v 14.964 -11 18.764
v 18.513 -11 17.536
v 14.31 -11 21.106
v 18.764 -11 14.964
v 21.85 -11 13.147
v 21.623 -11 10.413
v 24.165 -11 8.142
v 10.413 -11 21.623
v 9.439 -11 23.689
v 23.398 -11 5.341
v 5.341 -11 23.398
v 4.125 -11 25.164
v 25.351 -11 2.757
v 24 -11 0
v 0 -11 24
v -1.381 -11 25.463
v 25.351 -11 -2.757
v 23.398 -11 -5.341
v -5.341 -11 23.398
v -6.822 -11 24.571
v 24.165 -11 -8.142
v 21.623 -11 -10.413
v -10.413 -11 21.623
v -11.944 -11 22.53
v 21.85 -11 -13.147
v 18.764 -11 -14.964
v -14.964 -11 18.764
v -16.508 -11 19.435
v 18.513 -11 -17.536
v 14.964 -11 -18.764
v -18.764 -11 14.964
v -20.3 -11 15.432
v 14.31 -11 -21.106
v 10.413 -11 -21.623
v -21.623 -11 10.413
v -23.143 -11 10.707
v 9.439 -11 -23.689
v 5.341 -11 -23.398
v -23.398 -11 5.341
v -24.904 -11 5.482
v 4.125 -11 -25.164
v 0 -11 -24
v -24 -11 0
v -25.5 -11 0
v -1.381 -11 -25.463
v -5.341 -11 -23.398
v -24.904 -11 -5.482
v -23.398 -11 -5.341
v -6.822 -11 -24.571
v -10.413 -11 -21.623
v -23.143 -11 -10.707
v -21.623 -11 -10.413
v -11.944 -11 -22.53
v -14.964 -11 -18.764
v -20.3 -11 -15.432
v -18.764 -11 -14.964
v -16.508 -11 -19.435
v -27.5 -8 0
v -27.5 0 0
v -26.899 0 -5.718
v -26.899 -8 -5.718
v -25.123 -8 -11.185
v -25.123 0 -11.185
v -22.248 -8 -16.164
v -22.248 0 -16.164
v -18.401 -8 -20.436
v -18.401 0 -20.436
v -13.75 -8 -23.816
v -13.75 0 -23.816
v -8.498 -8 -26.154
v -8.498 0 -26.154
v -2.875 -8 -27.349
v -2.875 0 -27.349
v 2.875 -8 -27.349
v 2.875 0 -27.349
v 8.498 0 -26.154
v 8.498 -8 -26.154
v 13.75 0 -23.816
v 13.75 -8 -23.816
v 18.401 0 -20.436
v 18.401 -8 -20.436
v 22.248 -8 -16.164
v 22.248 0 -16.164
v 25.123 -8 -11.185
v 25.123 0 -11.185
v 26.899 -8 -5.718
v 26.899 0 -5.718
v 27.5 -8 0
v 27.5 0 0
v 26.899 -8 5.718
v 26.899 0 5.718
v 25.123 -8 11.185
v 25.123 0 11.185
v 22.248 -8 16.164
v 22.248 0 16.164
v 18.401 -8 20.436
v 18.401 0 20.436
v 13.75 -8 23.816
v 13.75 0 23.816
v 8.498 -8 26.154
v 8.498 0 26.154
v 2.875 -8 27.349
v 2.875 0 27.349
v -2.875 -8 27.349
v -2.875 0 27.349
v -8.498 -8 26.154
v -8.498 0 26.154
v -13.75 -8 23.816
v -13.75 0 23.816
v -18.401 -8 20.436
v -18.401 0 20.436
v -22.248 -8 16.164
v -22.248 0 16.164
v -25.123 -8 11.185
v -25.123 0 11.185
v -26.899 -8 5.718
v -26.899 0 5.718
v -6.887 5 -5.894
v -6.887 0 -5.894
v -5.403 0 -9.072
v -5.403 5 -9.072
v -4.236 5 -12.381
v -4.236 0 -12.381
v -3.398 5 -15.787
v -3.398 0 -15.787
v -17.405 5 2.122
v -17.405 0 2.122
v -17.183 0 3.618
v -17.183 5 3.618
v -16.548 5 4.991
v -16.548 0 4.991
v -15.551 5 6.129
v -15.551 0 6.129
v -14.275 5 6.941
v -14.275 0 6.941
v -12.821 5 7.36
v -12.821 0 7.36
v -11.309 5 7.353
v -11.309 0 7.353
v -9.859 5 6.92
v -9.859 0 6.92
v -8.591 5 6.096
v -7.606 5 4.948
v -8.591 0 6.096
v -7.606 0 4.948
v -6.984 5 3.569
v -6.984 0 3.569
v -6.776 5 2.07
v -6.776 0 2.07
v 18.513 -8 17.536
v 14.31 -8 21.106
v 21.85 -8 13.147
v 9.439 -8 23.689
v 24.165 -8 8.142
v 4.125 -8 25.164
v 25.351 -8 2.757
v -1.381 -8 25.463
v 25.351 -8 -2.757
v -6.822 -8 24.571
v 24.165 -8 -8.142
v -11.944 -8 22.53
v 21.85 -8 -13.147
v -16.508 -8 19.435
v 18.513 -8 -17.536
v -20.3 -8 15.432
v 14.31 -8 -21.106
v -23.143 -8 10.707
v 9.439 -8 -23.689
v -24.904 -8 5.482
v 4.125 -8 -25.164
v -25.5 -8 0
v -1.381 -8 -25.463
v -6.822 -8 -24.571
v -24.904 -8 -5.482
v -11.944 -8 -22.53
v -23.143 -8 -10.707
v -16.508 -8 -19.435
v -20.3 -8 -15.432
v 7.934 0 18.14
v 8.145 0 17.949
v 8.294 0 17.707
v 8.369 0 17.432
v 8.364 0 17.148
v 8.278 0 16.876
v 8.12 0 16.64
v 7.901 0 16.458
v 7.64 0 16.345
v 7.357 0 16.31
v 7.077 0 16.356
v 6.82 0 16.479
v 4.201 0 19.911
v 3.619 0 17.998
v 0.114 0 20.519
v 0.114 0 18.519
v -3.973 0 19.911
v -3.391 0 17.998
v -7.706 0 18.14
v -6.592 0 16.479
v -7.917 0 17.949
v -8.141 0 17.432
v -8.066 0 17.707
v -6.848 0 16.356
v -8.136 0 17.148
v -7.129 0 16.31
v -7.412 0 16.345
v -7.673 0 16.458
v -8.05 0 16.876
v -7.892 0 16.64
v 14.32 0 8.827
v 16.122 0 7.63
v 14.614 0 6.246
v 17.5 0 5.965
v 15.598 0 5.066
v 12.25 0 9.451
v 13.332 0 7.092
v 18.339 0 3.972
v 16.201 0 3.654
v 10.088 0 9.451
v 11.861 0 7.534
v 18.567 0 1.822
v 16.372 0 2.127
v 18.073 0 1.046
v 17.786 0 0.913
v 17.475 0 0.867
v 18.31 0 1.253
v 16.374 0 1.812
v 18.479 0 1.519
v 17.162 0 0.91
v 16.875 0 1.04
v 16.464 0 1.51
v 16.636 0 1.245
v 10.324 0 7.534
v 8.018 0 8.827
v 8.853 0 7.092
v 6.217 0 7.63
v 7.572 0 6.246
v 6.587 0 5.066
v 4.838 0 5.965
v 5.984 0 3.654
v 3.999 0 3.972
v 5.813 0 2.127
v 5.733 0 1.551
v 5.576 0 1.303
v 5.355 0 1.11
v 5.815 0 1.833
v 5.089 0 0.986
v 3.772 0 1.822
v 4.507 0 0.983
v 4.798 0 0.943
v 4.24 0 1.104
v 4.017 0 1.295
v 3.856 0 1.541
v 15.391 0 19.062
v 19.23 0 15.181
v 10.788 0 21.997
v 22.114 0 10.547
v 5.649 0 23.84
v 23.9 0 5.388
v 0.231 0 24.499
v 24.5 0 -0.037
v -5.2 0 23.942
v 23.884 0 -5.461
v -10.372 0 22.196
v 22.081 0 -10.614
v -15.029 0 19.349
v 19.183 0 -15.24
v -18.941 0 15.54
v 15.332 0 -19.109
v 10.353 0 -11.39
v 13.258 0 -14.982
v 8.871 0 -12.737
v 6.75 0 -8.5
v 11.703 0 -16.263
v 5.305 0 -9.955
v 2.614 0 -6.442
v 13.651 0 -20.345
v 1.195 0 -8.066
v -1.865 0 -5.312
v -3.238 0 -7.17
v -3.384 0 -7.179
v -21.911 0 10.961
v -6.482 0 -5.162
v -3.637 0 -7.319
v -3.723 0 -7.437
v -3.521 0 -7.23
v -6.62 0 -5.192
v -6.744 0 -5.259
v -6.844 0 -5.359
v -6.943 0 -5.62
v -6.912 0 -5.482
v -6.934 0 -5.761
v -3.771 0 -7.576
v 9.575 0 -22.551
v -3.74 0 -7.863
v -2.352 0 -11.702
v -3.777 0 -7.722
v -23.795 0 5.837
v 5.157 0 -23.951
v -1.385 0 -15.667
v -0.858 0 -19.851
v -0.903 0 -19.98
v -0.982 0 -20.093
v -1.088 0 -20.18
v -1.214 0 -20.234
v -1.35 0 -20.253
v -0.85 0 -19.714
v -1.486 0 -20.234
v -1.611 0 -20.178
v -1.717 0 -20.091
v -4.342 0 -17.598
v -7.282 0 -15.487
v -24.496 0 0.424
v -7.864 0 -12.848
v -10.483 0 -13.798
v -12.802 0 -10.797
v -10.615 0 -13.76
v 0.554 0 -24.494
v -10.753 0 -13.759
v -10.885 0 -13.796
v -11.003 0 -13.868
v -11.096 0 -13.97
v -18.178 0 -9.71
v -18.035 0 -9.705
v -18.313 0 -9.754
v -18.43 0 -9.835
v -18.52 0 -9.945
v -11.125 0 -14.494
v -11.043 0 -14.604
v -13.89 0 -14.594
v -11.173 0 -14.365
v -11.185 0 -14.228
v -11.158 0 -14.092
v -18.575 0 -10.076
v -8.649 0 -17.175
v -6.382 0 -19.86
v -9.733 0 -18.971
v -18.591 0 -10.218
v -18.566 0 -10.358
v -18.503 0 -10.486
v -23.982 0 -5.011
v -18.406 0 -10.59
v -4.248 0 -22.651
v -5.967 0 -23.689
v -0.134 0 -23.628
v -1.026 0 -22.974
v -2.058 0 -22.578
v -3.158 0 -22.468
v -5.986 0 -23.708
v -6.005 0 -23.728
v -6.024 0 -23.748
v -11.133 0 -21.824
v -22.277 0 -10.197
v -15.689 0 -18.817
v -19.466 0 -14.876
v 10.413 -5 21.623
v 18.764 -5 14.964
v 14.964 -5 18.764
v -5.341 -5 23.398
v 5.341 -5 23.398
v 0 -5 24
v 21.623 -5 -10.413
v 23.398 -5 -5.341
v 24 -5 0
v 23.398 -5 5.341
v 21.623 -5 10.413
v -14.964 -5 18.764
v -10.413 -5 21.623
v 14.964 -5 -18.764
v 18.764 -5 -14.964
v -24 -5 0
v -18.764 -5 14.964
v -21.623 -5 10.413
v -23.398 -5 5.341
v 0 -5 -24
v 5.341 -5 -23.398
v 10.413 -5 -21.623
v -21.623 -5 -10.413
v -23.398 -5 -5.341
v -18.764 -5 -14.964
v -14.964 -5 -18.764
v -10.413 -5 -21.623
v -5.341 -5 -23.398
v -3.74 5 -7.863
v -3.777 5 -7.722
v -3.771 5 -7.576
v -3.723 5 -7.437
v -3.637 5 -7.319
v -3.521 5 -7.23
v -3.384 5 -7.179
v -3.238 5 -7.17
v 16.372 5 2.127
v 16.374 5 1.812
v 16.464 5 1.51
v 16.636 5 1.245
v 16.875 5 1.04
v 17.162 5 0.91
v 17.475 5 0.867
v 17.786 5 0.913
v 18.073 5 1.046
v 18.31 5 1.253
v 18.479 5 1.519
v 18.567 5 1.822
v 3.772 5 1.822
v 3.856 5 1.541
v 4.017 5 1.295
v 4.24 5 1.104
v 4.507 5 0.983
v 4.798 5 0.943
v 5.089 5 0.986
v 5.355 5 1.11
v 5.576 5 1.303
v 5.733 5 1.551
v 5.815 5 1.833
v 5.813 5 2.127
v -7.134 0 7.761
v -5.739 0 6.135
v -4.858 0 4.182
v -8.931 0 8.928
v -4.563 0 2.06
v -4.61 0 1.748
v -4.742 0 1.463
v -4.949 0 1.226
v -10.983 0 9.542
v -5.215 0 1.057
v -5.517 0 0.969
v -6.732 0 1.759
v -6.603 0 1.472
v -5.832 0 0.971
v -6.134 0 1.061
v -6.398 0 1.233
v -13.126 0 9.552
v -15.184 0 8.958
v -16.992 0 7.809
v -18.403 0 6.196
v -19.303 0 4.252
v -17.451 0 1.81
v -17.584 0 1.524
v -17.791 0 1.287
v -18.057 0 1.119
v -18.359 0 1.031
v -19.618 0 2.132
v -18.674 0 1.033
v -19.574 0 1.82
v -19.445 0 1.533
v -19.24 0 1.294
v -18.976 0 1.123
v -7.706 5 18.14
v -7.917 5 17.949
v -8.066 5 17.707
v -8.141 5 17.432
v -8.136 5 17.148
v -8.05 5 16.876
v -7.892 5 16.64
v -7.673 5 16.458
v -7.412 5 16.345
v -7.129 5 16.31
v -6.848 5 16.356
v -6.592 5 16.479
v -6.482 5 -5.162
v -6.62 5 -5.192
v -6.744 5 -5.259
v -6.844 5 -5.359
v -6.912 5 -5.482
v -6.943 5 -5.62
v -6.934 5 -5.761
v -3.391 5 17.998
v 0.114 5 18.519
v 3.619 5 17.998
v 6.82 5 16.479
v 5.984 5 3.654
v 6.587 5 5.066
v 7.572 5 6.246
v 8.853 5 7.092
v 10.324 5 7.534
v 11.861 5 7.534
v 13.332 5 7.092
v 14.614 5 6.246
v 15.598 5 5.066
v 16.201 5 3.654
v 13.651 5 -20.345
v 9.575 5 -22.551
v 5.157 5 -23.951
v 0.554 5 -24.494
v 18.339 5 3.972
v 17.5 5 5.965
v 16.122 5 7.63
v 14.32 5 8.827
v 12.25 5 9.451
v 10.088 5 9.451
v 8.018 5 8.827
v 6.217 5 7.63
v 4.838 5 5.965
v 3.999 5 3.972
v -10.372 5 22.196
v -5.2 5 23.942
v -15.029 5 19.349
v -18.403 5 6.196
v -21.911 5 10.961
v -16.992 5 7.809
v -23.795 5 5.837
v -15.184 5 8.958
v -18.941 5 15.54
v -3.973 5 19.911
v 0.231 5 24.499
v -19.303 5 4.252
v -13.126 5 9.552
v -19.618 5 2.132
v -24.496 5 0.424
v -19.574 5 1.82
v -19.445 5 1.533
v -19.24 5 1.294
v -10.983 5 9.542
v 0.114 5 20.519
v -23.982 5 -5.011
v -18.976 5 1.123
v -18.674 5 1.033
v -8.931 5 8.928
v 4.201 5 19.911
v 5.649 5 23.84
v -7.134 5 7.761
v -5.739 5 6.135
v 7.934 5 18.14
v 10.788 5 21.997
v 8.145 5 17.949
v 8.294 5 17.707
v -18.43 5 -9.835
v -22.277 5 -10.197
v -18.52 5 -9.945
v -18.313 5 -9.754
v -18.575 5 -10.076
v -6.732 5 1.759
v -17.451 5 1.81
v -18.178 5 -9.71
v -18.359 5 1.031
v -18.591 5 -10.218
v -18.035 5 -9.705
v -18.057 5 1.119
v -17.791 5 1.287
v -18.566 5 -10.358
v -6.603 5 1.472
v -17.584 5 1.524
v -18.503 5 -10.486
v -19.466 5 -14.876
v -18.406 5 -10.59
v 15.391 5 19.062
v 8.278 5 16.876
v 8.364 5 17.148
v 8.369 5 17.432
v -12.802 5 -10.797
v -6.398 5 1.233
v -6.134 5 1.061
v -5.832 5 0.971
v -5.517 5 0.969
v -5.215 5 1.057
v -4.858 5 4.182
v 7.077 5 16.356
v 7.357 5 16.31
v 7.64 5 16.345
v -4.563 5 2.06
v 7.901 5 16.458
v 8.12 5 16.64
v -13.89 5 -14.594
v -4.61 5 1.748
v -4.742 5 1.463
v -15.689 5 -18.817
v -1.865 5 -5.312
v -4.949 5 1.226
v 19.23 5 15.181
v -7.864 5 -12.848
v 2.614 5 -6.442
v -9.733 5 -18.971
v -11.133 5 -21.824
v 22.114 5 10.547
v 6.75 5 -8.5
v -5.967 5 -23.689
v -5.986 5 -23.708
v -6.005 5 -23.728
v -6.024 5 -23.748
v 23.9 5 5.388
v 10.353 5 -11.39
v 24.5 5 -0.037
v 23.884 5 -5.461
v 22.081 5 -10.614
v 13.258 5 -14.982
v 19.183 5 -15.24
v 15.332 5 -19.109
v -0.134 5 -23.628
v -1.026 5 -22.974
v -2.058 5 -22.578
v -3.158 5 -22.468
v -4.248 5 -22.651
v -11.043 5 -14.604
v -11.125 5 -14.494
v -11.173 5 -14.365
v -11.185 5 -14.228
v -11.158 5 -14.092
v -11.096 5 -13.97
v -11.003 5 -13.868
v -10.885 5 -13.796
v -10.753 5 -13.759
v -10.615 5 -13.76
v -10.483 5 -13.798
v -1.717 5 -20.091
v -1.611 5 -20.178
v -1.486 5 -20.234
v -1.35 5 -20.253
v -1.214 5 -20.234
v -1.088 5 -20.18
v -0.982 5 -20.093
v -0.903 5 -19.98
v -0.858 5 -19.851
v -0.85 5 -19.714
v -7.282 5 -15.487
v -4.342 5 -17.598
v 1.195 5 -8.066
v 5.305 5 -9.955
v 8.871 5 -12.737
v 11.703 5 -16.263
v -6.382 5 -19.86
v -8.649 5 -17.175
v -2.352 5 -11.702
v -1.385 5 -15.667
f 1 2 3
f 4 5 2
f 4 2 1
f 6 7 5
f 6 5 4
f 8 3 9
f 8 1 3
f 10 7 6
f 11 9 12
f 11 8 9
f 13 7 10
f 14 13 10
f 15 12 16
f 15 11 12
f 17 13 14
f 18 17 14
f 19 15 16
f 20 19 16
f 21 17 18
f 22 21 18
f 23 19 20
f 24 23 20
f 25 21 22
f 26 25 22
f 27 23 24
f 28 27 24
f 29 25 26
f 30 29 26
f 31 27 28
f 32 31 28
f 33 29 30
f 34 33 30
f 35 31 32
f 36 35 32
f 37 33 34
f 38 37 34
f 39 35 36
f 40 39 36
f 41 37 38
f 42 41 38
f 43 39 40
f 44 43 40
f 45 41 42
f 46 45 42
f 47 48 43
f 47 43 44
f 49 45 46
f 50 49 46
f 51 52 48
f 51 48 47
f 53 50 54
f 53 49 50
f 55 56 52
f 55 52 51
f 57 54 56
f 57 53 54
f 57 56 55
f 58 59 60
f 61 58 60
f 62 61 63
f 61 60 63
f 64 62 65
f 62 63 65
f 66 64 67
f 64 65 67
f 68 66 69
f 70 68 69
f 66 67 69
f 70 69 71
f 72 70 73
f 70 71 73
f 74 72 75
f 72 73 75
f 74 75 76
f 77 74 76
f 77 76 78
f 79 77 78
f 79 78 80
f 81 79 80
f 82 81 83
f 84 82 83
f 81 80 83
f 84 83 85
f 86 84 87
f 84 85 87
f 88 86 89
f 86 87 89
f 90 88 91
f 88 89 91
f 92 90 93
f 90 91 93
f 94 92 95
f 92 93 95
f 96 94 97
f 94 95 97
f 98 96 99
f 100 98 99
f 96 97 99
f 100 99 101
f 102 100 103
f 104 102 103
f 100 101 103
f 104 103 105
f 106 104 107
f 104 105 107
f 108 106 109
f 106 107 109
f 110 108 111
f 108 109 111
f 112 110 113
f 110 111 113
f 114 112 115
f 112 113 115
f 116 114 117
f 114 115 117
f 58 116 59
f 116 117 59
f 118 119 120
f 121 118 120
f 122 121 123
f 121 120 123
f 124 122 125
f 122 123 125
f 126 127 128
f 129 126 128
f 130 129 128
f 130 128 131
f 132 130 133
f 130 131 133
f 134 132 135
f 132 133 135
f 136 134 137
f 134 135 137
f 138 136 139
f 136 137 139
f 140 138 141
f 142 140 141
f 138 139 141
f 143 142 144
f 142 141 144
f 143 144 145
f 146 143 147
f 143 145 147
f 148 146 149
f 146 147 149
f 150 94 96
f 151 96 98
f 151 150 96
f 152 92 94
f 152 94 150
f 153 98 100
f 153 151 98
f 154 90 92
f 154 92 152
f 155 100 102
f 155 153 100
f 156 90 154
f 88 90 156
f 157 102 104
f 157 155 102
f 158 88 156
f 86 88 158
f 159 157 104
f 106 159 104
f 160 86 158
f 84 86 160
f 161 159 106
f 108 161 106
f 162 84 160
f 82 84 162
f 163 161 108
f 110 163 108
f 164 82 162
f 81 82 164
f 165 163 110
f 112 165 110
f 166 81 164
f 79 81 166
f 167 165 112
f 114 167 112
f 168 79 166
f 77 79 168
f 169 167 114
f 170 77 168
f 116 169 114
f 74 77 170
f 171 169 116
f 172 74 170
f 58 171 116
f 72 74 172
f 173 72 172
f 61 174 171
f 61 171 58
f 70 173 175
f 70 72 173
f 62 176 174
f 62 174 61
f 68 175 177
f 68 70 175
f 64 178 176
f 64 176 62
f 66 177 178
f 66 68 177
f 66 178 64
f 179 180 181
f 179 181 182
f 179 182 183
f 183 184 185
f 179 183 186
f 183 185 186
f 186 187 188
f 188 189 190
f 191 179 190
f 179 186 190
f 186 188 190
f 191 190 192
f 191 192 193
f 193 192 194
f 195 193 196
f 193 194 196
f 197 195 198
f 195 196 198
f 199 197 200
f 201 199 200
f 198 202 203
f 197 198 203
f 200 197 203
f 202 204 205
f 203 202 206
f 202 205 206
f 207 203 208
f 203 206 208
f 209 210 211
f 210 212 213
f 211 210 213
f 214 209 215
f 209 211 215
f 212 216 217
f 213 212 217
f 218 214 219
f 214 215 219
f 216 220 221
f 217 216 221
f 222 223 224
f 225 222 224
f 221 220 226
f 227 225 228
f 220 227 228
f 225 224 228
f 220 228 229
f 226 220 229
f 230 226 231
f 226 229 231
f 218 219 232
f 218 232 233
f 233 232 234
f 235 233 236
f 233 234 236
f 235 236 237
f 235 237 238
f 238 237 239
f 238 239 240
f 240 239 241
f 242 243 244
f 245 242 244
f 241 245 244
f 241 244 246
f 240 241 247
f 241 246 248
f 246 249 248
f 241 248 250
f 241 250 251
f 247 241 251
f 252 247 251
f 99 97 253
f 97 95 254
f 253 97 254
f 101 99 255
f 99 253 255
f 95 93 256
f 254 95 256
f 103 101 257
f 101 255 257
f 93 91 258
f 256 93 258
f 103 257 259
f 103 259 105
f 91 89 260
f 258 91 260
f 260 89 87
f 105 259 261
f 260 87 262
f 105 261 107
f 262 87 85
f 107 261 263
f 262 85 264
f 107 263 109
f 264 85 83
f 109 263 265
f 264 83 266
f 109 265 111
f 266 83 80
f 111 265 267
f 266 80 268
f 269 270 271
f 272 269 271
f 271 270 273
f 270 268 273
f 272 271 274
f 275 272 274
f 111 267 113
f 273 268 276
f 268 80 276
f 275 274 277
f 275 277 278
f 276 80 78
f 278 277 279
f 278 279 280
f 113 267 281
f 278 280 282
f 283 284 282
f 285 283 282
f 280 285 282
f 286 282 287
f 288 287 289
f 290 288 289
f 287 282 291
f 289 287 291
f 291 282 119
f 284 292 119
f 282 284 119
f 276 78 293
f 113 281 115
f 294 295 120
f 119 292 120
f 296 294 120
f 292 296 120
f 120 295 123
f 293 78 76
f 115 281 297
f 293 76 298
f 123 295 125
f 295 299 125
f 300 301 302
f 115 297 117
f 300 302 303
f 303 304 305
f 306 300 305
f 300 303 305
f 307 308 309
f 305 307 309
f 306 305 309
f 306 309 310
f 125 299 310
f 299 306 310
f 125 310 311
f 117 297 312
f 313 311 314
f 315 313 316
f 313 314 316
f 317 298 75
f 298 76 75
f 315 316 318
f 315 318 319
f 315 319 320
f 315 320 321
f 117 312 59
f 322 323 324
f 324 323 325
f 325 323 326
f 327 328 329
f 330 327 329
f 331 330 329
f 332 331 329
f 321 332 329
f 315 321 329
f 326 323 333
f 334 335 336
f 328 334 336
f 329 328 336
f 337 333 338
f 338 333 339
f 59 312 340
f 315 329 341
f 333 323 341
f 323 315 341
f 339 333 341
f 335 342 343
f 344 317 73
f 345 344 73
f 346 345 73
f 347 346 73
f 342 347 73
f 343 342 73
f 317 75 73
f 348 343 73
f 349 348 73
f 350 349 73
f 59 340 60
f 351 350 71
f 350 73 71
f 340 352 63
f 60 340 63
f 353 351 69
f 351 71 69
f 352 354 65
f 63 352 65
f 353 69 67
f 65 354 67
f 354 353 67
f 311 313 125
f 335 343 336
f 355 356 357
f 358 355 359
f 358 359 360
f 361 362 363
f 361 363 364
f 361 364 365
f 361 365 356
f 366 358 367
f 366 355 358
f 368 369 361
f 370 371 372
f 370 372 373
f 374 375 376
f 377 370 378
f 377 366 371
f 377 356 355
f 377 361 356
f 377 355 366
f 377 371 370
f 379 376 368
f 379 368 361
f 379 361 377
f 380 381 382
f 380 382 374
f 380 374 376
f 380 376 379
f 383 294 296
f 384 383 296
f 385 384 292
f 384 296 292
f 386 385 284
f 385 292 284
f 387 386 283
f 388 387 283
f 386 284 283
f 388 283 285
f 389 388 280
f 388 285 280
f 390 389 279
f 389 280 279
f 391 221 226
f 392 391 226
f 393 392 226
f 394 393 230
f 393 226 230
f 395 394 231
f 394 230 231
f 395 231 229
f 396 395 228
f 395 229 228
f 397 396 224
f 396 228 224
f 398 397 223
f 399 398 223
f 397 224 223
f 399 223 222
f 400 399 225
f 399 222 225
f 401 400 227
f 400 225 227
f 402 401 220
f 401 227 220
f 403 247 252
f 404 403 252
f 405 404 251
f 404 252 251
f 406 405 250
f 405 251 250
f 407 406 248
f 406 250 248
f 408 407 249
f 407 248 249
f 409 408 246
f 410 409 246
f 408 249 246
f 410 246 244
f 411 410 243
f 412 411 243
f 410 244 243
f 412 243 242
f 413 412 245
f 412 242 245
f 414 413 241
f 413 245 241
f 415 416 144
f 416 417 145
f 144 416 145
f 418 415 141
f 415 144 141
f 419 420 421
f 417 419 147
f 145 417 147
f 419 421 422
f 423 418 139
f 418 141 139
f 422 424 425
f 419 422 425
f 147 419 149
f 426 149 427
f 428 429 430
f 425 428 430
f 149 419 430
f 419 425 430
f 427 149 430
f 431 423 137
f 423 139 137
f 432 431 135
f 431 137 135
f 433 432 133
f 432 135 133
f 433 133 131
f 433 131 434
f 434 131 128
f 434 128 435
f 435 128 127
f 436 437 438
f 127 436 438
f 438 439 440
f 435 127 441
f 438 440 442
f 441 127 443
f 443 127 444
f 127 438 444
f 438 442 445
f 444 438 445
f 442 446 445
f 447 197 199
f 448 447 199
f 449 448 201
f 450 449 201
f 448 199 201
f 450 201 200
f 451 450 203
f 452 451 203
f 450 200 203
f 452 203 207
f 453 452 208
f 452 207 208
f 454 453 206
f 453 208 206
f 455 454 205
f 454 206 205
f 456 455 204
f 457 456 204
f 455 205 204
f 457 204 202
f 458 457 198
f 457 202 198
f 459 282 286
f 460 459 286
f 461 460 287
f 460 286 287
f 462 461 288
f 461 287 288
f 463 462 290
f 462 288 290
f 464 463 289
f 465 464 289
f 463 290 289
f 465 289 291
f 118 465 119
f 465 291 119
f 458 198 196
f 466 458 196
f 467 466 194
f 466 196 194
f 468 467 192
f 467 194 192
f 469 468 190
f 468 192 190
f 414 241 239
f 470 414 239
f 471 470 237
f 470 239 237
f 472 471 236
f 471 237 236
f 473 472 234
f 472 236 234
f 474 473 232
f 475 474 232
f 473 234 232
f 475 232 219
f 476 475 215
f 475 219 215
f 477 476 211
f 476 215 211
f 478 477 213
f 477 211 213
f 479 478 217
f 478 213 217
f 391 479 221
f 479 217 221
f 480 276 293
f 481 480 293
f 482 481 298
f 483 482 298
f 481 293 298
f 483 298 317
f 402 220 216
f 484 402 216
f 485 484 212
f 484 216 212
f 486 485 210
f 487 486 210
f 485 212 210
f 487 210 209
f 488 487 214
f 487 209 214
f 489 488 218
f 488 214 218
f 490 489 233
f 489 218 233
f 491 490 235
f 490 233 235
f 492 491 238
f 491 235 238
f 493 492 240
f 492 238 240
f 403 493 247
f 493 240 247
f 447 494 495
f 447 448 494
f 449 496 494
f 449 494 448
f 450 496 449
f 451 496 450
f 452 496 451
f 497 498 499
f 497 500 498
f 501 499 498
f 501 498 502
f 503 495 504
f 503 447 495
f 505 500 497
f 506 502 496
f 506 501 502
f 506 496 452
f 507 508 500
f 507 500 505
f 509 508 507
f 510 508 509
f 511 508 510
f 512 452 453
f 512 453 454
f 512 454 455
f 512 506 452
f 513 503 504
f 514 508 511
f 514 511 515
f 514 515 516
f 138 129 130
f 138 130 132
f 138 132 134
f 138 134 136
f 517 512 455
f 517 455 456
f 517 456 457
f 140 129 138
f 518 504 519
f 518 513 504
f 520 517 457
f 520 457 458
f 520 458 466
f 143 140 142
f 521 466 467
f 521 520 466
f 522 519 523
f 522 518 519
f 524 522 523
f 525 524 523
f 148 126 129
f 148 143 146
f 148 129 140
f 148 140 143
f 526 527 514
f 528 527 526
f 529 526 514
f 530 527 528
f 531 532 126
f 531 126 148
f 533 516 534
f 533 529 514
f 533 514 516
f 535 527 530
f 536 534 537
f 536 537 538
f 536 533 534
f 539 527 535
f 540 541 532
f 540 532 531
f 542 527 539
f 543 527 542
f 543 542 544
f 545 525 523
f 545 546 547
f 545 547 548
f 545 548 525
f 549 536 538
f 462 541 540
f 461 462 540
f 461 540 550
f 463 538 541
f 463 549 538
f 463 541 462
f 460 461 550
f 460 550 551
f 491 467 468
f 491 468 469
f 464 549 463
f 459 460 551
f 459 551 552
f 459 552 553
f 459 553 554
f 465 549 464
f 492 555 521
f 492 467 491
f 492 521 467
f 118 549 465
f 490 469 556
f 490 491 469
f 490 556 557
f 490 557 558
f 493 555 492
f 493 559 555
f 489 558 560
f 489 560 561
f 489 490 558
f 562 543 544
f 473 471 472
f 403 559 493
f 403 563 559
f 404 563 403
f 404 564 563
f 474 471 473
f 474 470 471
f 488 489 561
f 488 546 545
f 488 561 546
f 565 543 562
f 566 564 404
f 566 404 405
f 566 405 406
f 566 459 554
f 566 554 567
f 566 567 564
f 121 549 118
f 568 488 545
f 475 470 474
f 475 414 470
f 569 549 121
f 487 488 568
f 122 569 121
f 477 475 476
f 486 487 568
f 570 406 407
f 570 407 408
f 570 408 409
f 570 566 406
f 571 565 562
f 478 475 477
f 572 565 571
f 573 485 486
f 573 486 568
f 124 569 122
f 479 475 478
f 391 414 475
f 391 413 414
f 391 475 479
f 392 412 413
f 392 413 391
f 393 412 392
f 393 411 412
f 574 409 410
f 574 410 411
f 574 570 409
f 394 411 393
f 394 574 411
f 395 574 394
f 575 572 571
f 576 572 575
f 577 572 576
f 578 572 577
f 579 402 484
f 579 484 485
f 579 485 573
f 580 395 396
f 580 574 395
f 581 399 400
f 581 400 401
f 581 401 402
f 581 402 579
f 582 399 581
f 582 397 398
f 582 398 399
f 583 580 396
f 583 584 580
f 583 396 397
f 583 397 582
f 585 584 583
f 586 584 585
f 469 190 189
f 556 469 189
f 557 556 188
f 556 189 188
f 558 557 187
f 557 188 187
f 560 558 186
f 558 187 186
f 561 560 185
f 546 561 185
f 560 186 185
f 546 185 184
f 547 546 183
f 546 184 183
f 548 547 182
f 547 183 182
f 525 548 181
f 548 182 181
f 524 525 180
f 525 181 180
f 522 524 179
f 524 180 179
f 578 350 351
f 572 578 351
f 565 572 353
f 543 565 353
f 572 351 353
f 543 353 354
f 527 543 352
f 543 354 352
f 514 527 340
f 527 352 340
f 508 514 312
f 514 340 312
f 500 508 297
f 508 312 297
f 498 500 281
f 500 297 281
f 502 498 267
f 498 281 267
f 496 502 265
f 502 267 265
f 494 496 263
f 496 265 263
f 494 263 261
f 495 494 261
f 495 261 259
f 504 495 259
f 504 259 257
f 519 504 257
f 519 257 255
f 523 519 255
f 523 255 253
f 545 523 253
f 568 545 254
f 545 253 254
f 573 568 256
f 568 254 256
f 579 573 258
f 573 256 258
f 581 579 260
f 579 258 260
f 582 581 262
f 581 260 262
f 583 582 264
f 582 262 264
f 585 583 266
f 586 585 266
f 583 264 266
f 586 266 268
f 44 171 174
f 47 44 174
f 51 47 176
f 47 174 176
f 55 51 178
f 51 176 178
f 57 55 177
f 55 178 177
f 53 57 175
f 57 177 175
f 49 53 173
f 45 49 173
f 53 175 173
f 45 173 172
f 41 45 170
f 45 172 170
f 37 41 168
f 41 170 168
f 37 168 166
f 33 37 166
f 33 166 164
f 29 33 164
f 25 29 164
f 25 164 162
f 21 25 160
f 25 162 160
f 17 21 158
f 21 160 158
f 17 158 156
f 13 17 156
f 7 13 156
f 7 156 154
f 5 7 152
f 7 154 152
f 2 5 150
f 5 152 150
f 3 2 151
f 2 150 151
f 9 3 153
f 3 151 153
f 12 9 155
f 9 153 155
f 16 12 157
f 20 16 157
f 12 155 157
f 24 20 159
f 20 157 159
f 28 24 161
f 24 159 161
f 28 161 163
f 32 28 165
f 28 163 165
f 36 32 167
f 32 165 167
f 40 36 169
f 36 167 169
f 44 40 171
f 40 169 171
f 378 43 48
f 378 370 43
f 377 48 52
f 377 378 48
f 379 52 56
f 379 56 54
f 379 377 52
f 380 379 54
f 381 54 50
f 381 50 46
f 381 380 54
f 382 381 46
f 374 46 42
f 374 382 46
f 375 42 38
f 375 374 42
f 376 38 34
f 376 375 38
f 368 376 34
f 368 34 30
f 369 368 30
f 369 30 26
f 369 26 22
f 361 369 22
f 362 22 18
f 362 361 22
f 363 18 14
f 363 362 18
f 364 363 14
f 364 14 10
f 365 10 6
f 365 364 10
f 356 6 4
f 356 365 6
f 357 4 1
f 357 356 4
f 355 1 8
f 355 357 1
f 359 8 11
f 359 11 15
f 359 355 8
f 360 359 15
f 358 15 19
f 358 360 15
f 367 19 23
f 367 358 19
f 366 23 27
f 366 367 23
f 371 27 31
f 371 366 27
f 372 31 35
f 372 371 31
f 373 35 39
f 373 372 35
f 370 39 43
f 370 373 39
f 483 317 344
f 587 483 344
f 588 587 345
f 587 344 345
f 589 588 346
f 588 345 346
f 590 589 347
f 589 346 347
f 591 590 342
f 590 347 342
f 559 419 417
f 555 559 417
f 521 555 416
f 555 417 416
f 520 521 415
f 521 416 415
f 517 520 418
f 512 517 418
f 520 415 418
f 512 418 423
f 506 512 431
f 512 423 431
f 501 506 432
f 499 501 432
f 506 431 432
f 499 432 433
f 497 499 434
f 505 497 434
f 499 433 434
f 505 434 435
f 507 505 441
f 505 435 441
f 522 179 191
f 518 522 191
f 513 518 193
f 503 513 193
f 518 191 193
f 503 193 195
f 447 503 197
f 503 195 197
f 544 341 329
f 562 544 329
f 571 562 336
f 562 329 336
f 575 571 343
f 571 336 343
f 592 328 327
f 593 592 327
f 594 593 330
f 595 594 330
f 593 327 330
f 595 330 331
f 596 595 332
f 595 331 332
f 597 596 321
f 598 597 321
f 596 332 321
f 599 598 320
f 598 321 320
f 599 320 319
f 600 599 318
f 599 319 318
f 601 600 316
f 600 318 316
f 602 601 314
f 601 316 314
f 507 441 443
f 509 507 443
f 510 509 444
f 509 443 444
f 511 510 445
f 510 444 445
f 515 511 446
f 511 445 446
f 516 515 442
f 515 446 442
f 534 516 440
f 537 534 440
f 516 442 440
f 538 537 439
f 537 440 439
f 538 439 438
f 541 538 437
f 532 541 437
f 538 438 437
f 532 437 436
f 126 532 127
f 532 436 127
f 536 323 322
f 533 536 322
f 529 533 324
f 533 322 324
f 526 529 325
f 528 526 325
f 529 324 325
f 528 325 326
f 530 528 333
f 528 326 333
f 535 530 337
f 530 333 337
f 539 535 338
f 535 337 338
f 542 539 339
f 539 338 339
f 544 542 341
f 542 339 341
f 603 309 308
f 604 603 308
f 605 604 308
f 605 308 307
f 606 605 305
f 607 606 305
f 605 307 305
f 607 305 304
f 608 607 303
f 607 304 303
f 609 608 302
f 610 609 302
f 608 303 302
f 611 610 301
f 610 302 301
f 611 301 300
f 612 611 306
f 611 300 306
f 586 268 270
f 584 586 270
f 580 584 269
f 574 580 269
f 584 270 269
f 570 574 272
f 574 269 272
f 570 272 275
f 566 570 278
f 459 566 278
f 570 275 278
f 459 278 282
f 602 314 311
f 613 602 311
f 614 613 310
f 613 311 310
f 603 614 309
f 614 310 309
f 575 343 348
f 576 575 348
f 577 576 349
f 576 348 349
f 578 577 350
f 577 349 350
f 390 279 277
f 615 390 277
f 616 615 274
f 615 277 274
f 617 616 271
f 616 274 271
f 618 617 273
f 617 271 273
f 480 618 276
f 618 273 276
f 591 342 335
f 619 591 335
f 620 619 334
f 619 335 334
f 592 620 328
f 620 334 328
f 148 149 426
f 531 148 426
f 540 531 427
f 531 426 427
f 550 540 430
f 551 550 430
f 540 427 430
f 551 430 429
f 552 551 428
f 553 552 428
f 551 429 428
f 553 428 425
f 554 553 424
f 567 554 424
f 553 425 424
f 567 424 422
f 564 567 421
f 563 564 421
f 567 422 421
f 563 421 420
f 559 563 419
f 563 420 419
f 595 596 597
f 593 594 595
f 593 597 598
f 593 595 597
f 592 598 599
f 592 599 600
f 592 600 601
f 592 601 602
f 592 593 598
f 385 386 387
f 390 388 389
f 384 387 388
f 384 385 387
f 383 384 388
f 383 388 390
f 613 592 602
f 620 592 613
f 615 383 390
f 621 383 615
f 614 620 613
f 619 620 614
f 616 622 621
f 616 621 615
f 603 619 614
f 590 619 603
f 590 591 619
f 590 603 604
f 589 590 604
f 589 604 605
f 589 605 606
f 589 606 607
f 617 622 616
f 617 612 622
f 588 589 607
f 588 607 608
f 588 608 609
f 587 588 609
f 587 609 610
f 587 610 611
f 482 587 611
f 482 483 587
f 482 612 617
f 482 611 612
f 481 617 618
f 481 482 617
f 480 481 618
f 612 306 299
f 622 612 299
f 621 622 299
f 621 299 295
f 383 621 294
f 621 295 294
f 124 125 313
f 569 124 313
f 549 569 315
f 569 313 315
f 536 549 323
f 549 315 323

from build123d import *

# Parameters (mm, degrees)
SALIENTE_EXTRUIR1_DEPTH   = 5
SALIENTE_EXTRUIR1_2_DEPTH = 5
CROQUIS2_R                = 27.5
SALIENTE_EXTRUIR2_DEPTH   = 8
CROQUIS3_R                = 25.5
CROQUIS3_R_2              = 24
SALIENTE_EXTRUIR3_DEPTH   = 3
CROQUIS4_R                = 24
CORTAR_EXTRUIR1_DEPTH     = 3


with BuildPart() as part:
    # Croquis1 → Saliente-Extruir1 (new body)
    with BuildSketch(Plane(origin=(0, 0, 0), x_dir=(1, 0, 0), z_dir=(0, 1, 0))):
        with BuildLine():
            ThreePointArc((-6.024394544, 23.747771903), (-5.19984533, -23.941838036), (15.332388636, 19.109365733))
            ThreePointArc((15.332388636, 19.109365733), (6.749911309, 8.499710515), (-6.481910722, 5.161659186))
            ThreePointArc((-6.481910722, 5.161659186), (-6.882152879, 5.418254788), (-6.886809038, 5.893663462))
            ThreePointArc((-6.886809038, 5.893663462), (-4.77910195, 10.712326415), (-3.398196642, 15.787269012))
            ThreePointArc((-3.398196642, 15.787269012), (-10.284746472, 11.706352258), (-18.035485402, 9.705228534))
            ThreePointArc((-18.035485402, 9.705228534), (-18.552255418, 10.008822773), (-18.406444405, 10.590165925))
            ThreePointArc((-18.406444405, 10.590165925), (-11.764118021, 16.738249367), (-5.966725479, 23.688765141))
            ThreePointArc((-5.966725479, 23.688765141), (-5.995706248, 23.718125601), (-6.024394544, 23.747771903))
        make_face()
        with BuildLine():
            ThreePointArc((-4.563193765, -2.059824722), (-12.054197272, -9.623389101), (-19.617761652, -2.132385594))
            ThreePointArc((-19.617761652, -2.132385594), (-18.516794481, -1.020754013), (-17.4051629, -2.121721183))
            ThreePointArc((-17.4051629, -2.121721183), (-12.064848376, -7.410803529), (-6.775766031, -2.070489005))
            ThreePointArc((-6.775766031, -2.070489005), (-5.67481204, -0.958870731), (-4.563193765, -2.059824722))
        make_face(mode=Mode.SUBTRACT)
        with BuildLine():
            ThreePointArc((7.93388408, -18.140011178), (0.114097404, -20.519185991), (-7.705689271, -18.140011178))
            ThreePointArc((-7.705689271, -18.140011178), (-7.979292605, -16.752516596), (-6.591798022, -16.478913263))
            ThreePointArc((-6.591798022, -16.478913263), (0.114097404, -18.519185991), (6.819992831, -16.478913263))
            ThreePointArc((6.819992831, -16.478913263), (8.207487413, -16.752516596), (7.93388408, -18.140011178))
        make_face(mode=Mode.SUBTRACT)
        with BuildLine():
            ThreePointArc((18.566554033, -1.822088449), (11.169349937, -9.530541219), (3.772145841, -1.822088449))
            ThreePointArc((3.772145841, -1.822088449), (4.944999806, -0.954199424), (5.812888831, -2.127053389))
            ThreePointArc((5.812888831, -2.127053389), (11.092516644, -7.59016676), (16.372144456, -2.127053389))
            ThreePointArc((16.372144456, -2.127053389), (17.316866775, -0.877366131), (18.566554033, -1.822088449))
        make_face(mode=Mode.SUBTRACT)
    extrude(amount=SALIENTE_EXTRUIR1_DEPTH)



with BuildPart() as body_2:
    # Croquis1 → Saliente-Extruir1 2 (new body)
    with BuildSketch(Plane(origin=(0, 0, 0), x_dir=(1, 0, 0), z_dir=(0, 1, 0))):
        with BuildLine():
            ThreePointArc((-3.237616322, 7.170010781), (7.168200526, 11.242778225), (13.650668654, 20.344759652))
            ThreePointArc((13.650668654, 20.344759652), (7.399029371, 23.35603486), (0.553855765, 24.493738869))
            ThreePointArc((0.553855765, 24.493738869), (-1.528467266, 22.741552063), (-4.248394951, 22.650881235))
            ThreePointArc((-4.248394951, 22.650881235), (-7.499015993, 18.503713558), (-11.043045611, 14.604304504))
            ThreePointArc((-11.043045611, 14.604304504), (-11.096230859, 13.969574186), (-10.482918218, 13.797647311))
            ThreePointArc((-10.482918218, 13.797647311), (-5.775579982, 16.492523924), (-1.716909146, 20.090938058))
            ThreePointArc((-1.716909146, 20.090938058), (-1.149234355, 20.211325601), (-0.850096282, 19.714068884))
            ThreePointArc((-0.850096282, 19.714068884), (-1.814955726, 13.671675172), (-3.739754637, 7.863351432))
            ThreePointArc((-3.739754637, 7.863351432), (-3.684337904, 7.37498369), (-3.237616322, 7.170010781))
        make_face()
    extrude(amount=SALIENTE_EXTRUIR1_2_DEPTH)


with BuildPart() as part_1:
    add(part.part)

    add(body_2.part)  # Saliente-Extruir2 merges body 2
    # Croquis2 → Saliente-Extruir2 (add)
    with BuildSketch(Plane(origin=(0, 0, 0), x_dir=(-1, 0, 0), z_dir=(0, -1, 0))):
        Circle(CROQUIS2_R)
    extrude(amount=SALIENTE_EXTRUIR2_DEPTH)

    # Croquis3 → Saliente-Extruir3 (add)
    with BuildSketch(Plane(origin=(0, -8, 0), x_dir=(-1, 0, 0), z_dir=(0, -1, 0))):
        Circle(CROQUIS3_R)
        Circle(CROQUIS3_R_2, mode=Mode.SUBTRACT)
    extrude(amount=SALIENTE_EXTRUIR3_DEPTH)

    # Croquis4 → Cortar-Extruir1 (cut)
    with BuildSketch(Plane(origin=(0, -8, 0), x_dir=(-1, 0, 0), z_dir=(0, -1, 0))):
        Circle(CROQUIS4_R)
    extrude(amount=-CORTAR_EXTRUIR1_DEPTH, mode=Mode.SUBTRACT)


solid = part_1.part
